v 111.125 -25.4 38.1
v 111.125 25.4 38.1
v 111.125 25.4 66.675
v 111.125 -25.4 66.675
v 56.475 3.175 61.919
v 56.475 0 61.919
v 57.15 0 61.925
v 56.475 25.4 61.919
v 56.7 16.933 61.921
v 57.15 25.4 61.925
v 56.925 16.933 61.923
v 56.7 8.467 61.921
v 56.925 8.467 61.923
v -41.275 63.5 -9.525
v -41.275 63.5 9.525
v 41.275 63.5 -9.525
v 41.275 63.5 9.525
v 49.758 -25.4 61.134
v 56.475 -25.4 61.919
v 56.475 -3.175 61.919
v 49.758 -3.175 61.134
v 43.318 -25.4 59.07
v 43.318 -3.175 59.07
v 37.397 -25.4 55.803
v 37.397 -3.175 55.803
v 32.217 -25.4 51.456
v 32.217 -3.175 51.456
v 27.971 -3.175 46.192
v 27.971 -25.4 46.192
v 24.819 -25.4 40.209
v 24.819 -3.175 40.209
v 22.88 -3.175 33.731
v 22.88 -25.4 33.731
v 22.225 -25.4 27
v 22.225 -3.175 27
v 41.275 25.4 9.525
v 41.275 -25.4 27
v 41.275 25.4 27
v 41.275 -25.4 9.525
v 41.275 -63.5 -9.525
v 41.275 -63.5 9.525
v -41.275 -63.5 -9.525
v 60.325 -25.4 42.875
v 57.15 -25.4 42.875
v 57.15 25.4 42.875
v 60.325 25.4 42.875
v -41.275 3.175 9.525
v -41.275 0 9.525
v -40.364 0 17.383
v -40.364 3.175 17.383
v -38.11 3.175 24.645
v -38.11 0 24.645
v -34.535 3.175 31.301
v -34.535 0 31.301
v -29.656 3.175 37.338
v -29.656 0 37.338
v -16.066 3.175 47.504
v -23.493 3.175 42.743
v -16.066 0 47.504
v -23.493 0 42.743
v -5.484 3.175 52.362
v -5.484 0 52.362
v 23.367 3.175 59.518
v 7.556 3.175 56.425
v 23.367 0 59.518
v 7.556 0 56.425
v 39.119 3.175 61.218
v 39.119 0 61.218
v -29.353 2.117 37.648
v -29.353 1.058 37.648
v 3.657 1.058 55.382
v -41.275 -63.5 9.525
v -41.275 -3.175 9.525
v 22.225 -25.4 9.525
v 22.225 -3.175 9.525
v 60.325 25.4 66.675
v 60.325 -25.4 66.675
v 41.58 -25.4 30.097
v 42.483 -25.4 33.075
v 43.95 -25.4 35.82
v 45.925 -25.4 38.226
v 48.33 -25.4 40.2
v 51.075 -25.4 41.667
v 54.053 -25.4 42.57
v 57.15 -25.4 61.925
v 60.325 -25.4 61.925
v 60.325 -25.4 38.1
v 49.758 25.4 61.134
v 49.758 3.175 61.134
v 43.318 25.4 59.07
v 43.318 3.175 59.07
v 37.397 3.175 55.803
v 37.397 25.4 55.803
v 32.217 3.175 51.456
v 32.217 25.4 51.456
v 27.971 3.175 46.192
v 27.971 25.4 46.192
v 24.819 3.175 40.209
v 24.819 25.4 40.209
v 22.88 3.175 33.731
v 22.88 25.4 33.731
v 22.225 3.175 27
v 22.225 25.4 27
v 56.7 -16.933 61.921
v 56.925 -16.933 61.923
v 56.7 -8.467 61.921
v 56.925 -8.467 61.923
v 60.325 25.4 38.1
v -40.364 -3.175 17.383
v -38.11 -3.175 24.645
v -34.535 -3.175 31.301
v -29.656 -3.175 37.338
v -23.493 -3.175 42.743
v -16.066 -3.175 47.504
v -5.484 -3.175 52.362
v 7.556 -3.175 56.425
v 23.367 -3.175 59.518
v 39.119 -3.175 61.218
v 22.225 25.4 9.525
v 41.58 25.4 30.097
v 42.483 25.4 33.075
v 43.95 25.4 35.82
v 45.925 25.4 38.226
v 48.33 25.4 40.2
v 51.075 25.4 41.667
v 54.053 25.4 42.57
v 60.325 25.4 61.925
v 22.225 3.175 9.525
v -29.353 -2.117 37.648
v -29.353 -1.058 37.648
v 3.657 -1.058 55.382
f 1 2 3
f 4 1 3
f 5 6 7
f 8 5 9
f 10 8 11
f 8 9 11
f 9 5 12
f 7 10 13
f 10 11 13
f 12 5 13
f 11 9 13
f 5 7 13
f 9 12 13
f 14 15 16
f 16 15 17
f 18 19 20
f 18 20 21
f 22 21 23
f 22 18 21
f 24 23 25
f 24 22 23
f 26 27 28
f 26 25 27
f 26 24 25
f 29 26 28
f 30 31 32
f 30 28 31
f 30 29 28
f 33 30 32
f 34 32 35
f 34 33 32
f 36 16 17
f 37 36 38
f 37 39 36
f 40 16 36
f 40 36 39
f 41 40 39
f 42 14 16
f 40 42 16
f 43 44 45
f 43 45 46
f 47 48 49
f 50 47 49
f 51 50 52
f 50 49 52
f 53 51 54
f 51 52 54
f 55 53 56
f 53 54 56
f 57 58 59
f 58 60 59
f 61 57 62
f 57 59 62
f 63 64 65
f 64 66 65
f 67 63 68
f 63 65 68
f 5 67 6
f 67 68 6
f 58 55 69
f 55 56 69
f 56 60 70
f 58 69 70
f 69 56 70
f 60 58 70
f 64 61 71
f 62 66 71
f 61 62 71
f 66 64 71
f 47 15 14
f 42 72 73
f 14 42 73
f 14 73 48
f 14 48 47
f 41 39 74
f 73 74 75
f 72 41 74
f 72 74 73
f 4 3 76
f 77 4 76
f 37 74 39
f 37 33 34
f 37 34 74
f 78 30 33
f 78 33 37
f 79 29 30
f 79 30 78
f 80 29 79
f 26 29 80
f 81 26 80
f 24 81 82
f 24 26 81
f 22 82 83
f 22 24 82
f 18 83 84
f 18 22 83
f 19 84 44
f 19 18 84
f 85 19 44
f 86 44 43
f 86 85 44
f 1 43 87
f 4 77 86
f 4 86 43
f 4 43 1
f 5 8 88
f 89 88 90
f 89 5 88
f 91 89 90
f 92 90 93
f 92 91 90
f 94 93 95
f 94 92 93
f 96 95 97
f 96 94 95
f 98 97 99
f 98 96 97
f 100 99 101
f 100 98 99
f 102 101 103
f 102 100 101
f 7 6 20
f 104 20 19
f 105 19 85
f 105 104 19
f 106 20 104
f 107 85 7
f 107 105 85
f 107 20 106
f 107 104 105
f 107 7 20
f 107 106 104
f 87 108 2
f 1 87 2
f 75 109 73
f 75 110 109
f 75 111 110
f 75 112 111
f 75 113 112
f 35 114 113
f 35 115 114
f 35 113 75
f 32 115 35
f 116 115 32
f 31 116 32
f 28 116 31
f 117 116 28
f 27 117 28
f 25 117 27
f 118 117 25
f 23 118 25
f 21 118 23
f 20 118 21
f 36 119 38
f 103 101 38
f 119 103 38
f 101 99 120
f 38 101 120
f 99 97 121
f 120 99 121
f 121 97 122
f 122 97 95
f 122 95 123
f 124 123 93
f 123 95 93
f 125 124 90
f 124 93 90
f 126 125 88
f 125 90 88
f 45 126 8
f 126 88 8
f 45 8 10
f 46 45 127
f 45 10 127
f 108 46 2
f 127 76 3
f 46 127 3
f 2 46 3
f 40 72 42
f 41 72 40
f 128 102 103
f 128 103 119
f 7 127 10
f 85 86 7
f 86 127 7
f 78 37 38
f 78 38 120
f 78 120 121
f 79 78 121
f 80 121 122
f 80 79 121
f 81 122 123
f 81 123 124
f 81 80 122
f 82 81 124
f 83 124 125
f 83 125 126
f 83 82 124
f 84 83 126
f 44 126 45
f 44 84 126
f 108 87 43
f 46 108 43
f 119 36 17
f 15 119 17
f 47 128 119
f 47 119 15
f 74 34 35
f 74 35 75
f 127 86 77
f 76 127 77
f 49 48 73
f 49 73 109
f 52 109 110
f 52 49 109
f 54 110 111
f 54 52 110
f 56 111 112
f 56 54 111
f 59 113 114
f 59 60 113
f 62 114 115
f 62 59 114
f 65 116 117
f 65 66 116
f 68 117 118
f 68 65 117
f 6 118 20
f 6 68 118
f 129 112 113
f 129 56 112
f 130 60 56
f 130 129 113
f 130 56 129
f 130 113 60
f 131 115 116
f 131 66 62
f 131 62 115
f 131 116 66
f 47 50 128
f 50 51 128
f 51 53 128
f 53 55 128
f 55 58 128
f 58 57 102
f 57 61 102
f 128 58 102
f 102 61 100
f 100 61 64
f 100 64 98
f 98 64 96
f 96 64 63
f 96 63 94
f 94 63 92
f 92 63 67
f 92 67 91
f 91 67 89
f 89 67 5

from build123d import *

# Parameters (mm, degrees)
F1_DEPTH = 63.5
F0_W     = 25.4
F0_H     = 19.05
F0_H_2   = 4.7498
F0_H_3   = 4.7752
F2_DEPTH = 25.4
F3_DEPTH = 3.175


with BuildPart() as f1:
    # F0 (on Front) → F1 (new body, symmetric)
    with BuildSketch(Plane.XZ):
        Polygon((41.275, -9.525), (41.275, 9.525), (22.225, 9.525), (-41.275, 9.525), (-41.275, -9.525), align=None)
    extrude(amount=F1_DEPTH, both=True)

    # F0 (on Front) → F2 (join, symmetric)
    with BuildSketch(Plane.XZ):
        with BuildLine():
            Line((22.225, 9.525), (41.275, 9.525))
            Line((41.275, 9.525), (41.275, 27.0002))
            ThreePointArc((41.275, 27.0002), (45.9246798487, 38.2255201513), (57.15, 42.8752))
            Line((57.15, 42.8752), (60.325, 42.8752))
            Line((60.325, 42.8752), (60.325, 61.9252))
            Line((60.325, 61.9252), (57.15, 61.9252))
            add(Edge.make_bspline(
                [(56.4749540352, 61.918675596), (56.6996080487, 61.9210846783), (56.9246234605, 61.9232595365), (57.15, 61.9252)],
                knots=[111.1038560416, 111.1038560416, 111.1038560416, 111.1038560416, 111.5045361635, 111.5045361635, 111.5045361635, 111.5045361635], degree=3))
            ThreePointArc((56.4749540352, 61.918675596), (32.2167731198, 51.4560750066), (22.225, 27.0002))
            Line((22.225, 27.0002), (22.225, 9.525))
        make_face()
        with Locations((73.025, 52.4002)):
            Rectangle(F0_W, F0_H)
        Polygon((85.725, 61.9252), (85.725, 42.8752), (85.725, 38.1), (111.125, 38.1), (111.125, 66.675), (85.725, 66.675), align=None)
        with Locations((73.025, 64.3001)):
            Rectangle(F0_W, F0_H_2)
        with Locations((73.025, 40.4876)):
            Rectangle(F0_W, F0_H_3)
    extrude(amount=F2_DEPTH, both=True)

    # F0 (on Front) → F3 (join, symmetric)
    with BuildSketch(Plane.XZ):
        with BuildLine():
            Line((-41.275, 9.525), (22.225, 9.525))
            Line((22.225, 9.525), (22.225, 27.0002))
            ThreePointArc((22.225, 27.0002), (32.2167731198, 51.4560750066), (56.4749540352, 61.918675596))
            add(Edge.make_bspline(
                [(-41.275, 9.525), (-40.3253856931, 42.5734618465), (-5.8189452735, 61.2506655739), (56.4749540352, 61.918675596)],
                knots=[0, 0, 0, 0, 111.1038560416, 111.1038560416, 111.1038560416, 111.1038560416], degree=3))
        make_face()
    extrude(amount=F3_DEPTH, both=True)


solid = f1.part
